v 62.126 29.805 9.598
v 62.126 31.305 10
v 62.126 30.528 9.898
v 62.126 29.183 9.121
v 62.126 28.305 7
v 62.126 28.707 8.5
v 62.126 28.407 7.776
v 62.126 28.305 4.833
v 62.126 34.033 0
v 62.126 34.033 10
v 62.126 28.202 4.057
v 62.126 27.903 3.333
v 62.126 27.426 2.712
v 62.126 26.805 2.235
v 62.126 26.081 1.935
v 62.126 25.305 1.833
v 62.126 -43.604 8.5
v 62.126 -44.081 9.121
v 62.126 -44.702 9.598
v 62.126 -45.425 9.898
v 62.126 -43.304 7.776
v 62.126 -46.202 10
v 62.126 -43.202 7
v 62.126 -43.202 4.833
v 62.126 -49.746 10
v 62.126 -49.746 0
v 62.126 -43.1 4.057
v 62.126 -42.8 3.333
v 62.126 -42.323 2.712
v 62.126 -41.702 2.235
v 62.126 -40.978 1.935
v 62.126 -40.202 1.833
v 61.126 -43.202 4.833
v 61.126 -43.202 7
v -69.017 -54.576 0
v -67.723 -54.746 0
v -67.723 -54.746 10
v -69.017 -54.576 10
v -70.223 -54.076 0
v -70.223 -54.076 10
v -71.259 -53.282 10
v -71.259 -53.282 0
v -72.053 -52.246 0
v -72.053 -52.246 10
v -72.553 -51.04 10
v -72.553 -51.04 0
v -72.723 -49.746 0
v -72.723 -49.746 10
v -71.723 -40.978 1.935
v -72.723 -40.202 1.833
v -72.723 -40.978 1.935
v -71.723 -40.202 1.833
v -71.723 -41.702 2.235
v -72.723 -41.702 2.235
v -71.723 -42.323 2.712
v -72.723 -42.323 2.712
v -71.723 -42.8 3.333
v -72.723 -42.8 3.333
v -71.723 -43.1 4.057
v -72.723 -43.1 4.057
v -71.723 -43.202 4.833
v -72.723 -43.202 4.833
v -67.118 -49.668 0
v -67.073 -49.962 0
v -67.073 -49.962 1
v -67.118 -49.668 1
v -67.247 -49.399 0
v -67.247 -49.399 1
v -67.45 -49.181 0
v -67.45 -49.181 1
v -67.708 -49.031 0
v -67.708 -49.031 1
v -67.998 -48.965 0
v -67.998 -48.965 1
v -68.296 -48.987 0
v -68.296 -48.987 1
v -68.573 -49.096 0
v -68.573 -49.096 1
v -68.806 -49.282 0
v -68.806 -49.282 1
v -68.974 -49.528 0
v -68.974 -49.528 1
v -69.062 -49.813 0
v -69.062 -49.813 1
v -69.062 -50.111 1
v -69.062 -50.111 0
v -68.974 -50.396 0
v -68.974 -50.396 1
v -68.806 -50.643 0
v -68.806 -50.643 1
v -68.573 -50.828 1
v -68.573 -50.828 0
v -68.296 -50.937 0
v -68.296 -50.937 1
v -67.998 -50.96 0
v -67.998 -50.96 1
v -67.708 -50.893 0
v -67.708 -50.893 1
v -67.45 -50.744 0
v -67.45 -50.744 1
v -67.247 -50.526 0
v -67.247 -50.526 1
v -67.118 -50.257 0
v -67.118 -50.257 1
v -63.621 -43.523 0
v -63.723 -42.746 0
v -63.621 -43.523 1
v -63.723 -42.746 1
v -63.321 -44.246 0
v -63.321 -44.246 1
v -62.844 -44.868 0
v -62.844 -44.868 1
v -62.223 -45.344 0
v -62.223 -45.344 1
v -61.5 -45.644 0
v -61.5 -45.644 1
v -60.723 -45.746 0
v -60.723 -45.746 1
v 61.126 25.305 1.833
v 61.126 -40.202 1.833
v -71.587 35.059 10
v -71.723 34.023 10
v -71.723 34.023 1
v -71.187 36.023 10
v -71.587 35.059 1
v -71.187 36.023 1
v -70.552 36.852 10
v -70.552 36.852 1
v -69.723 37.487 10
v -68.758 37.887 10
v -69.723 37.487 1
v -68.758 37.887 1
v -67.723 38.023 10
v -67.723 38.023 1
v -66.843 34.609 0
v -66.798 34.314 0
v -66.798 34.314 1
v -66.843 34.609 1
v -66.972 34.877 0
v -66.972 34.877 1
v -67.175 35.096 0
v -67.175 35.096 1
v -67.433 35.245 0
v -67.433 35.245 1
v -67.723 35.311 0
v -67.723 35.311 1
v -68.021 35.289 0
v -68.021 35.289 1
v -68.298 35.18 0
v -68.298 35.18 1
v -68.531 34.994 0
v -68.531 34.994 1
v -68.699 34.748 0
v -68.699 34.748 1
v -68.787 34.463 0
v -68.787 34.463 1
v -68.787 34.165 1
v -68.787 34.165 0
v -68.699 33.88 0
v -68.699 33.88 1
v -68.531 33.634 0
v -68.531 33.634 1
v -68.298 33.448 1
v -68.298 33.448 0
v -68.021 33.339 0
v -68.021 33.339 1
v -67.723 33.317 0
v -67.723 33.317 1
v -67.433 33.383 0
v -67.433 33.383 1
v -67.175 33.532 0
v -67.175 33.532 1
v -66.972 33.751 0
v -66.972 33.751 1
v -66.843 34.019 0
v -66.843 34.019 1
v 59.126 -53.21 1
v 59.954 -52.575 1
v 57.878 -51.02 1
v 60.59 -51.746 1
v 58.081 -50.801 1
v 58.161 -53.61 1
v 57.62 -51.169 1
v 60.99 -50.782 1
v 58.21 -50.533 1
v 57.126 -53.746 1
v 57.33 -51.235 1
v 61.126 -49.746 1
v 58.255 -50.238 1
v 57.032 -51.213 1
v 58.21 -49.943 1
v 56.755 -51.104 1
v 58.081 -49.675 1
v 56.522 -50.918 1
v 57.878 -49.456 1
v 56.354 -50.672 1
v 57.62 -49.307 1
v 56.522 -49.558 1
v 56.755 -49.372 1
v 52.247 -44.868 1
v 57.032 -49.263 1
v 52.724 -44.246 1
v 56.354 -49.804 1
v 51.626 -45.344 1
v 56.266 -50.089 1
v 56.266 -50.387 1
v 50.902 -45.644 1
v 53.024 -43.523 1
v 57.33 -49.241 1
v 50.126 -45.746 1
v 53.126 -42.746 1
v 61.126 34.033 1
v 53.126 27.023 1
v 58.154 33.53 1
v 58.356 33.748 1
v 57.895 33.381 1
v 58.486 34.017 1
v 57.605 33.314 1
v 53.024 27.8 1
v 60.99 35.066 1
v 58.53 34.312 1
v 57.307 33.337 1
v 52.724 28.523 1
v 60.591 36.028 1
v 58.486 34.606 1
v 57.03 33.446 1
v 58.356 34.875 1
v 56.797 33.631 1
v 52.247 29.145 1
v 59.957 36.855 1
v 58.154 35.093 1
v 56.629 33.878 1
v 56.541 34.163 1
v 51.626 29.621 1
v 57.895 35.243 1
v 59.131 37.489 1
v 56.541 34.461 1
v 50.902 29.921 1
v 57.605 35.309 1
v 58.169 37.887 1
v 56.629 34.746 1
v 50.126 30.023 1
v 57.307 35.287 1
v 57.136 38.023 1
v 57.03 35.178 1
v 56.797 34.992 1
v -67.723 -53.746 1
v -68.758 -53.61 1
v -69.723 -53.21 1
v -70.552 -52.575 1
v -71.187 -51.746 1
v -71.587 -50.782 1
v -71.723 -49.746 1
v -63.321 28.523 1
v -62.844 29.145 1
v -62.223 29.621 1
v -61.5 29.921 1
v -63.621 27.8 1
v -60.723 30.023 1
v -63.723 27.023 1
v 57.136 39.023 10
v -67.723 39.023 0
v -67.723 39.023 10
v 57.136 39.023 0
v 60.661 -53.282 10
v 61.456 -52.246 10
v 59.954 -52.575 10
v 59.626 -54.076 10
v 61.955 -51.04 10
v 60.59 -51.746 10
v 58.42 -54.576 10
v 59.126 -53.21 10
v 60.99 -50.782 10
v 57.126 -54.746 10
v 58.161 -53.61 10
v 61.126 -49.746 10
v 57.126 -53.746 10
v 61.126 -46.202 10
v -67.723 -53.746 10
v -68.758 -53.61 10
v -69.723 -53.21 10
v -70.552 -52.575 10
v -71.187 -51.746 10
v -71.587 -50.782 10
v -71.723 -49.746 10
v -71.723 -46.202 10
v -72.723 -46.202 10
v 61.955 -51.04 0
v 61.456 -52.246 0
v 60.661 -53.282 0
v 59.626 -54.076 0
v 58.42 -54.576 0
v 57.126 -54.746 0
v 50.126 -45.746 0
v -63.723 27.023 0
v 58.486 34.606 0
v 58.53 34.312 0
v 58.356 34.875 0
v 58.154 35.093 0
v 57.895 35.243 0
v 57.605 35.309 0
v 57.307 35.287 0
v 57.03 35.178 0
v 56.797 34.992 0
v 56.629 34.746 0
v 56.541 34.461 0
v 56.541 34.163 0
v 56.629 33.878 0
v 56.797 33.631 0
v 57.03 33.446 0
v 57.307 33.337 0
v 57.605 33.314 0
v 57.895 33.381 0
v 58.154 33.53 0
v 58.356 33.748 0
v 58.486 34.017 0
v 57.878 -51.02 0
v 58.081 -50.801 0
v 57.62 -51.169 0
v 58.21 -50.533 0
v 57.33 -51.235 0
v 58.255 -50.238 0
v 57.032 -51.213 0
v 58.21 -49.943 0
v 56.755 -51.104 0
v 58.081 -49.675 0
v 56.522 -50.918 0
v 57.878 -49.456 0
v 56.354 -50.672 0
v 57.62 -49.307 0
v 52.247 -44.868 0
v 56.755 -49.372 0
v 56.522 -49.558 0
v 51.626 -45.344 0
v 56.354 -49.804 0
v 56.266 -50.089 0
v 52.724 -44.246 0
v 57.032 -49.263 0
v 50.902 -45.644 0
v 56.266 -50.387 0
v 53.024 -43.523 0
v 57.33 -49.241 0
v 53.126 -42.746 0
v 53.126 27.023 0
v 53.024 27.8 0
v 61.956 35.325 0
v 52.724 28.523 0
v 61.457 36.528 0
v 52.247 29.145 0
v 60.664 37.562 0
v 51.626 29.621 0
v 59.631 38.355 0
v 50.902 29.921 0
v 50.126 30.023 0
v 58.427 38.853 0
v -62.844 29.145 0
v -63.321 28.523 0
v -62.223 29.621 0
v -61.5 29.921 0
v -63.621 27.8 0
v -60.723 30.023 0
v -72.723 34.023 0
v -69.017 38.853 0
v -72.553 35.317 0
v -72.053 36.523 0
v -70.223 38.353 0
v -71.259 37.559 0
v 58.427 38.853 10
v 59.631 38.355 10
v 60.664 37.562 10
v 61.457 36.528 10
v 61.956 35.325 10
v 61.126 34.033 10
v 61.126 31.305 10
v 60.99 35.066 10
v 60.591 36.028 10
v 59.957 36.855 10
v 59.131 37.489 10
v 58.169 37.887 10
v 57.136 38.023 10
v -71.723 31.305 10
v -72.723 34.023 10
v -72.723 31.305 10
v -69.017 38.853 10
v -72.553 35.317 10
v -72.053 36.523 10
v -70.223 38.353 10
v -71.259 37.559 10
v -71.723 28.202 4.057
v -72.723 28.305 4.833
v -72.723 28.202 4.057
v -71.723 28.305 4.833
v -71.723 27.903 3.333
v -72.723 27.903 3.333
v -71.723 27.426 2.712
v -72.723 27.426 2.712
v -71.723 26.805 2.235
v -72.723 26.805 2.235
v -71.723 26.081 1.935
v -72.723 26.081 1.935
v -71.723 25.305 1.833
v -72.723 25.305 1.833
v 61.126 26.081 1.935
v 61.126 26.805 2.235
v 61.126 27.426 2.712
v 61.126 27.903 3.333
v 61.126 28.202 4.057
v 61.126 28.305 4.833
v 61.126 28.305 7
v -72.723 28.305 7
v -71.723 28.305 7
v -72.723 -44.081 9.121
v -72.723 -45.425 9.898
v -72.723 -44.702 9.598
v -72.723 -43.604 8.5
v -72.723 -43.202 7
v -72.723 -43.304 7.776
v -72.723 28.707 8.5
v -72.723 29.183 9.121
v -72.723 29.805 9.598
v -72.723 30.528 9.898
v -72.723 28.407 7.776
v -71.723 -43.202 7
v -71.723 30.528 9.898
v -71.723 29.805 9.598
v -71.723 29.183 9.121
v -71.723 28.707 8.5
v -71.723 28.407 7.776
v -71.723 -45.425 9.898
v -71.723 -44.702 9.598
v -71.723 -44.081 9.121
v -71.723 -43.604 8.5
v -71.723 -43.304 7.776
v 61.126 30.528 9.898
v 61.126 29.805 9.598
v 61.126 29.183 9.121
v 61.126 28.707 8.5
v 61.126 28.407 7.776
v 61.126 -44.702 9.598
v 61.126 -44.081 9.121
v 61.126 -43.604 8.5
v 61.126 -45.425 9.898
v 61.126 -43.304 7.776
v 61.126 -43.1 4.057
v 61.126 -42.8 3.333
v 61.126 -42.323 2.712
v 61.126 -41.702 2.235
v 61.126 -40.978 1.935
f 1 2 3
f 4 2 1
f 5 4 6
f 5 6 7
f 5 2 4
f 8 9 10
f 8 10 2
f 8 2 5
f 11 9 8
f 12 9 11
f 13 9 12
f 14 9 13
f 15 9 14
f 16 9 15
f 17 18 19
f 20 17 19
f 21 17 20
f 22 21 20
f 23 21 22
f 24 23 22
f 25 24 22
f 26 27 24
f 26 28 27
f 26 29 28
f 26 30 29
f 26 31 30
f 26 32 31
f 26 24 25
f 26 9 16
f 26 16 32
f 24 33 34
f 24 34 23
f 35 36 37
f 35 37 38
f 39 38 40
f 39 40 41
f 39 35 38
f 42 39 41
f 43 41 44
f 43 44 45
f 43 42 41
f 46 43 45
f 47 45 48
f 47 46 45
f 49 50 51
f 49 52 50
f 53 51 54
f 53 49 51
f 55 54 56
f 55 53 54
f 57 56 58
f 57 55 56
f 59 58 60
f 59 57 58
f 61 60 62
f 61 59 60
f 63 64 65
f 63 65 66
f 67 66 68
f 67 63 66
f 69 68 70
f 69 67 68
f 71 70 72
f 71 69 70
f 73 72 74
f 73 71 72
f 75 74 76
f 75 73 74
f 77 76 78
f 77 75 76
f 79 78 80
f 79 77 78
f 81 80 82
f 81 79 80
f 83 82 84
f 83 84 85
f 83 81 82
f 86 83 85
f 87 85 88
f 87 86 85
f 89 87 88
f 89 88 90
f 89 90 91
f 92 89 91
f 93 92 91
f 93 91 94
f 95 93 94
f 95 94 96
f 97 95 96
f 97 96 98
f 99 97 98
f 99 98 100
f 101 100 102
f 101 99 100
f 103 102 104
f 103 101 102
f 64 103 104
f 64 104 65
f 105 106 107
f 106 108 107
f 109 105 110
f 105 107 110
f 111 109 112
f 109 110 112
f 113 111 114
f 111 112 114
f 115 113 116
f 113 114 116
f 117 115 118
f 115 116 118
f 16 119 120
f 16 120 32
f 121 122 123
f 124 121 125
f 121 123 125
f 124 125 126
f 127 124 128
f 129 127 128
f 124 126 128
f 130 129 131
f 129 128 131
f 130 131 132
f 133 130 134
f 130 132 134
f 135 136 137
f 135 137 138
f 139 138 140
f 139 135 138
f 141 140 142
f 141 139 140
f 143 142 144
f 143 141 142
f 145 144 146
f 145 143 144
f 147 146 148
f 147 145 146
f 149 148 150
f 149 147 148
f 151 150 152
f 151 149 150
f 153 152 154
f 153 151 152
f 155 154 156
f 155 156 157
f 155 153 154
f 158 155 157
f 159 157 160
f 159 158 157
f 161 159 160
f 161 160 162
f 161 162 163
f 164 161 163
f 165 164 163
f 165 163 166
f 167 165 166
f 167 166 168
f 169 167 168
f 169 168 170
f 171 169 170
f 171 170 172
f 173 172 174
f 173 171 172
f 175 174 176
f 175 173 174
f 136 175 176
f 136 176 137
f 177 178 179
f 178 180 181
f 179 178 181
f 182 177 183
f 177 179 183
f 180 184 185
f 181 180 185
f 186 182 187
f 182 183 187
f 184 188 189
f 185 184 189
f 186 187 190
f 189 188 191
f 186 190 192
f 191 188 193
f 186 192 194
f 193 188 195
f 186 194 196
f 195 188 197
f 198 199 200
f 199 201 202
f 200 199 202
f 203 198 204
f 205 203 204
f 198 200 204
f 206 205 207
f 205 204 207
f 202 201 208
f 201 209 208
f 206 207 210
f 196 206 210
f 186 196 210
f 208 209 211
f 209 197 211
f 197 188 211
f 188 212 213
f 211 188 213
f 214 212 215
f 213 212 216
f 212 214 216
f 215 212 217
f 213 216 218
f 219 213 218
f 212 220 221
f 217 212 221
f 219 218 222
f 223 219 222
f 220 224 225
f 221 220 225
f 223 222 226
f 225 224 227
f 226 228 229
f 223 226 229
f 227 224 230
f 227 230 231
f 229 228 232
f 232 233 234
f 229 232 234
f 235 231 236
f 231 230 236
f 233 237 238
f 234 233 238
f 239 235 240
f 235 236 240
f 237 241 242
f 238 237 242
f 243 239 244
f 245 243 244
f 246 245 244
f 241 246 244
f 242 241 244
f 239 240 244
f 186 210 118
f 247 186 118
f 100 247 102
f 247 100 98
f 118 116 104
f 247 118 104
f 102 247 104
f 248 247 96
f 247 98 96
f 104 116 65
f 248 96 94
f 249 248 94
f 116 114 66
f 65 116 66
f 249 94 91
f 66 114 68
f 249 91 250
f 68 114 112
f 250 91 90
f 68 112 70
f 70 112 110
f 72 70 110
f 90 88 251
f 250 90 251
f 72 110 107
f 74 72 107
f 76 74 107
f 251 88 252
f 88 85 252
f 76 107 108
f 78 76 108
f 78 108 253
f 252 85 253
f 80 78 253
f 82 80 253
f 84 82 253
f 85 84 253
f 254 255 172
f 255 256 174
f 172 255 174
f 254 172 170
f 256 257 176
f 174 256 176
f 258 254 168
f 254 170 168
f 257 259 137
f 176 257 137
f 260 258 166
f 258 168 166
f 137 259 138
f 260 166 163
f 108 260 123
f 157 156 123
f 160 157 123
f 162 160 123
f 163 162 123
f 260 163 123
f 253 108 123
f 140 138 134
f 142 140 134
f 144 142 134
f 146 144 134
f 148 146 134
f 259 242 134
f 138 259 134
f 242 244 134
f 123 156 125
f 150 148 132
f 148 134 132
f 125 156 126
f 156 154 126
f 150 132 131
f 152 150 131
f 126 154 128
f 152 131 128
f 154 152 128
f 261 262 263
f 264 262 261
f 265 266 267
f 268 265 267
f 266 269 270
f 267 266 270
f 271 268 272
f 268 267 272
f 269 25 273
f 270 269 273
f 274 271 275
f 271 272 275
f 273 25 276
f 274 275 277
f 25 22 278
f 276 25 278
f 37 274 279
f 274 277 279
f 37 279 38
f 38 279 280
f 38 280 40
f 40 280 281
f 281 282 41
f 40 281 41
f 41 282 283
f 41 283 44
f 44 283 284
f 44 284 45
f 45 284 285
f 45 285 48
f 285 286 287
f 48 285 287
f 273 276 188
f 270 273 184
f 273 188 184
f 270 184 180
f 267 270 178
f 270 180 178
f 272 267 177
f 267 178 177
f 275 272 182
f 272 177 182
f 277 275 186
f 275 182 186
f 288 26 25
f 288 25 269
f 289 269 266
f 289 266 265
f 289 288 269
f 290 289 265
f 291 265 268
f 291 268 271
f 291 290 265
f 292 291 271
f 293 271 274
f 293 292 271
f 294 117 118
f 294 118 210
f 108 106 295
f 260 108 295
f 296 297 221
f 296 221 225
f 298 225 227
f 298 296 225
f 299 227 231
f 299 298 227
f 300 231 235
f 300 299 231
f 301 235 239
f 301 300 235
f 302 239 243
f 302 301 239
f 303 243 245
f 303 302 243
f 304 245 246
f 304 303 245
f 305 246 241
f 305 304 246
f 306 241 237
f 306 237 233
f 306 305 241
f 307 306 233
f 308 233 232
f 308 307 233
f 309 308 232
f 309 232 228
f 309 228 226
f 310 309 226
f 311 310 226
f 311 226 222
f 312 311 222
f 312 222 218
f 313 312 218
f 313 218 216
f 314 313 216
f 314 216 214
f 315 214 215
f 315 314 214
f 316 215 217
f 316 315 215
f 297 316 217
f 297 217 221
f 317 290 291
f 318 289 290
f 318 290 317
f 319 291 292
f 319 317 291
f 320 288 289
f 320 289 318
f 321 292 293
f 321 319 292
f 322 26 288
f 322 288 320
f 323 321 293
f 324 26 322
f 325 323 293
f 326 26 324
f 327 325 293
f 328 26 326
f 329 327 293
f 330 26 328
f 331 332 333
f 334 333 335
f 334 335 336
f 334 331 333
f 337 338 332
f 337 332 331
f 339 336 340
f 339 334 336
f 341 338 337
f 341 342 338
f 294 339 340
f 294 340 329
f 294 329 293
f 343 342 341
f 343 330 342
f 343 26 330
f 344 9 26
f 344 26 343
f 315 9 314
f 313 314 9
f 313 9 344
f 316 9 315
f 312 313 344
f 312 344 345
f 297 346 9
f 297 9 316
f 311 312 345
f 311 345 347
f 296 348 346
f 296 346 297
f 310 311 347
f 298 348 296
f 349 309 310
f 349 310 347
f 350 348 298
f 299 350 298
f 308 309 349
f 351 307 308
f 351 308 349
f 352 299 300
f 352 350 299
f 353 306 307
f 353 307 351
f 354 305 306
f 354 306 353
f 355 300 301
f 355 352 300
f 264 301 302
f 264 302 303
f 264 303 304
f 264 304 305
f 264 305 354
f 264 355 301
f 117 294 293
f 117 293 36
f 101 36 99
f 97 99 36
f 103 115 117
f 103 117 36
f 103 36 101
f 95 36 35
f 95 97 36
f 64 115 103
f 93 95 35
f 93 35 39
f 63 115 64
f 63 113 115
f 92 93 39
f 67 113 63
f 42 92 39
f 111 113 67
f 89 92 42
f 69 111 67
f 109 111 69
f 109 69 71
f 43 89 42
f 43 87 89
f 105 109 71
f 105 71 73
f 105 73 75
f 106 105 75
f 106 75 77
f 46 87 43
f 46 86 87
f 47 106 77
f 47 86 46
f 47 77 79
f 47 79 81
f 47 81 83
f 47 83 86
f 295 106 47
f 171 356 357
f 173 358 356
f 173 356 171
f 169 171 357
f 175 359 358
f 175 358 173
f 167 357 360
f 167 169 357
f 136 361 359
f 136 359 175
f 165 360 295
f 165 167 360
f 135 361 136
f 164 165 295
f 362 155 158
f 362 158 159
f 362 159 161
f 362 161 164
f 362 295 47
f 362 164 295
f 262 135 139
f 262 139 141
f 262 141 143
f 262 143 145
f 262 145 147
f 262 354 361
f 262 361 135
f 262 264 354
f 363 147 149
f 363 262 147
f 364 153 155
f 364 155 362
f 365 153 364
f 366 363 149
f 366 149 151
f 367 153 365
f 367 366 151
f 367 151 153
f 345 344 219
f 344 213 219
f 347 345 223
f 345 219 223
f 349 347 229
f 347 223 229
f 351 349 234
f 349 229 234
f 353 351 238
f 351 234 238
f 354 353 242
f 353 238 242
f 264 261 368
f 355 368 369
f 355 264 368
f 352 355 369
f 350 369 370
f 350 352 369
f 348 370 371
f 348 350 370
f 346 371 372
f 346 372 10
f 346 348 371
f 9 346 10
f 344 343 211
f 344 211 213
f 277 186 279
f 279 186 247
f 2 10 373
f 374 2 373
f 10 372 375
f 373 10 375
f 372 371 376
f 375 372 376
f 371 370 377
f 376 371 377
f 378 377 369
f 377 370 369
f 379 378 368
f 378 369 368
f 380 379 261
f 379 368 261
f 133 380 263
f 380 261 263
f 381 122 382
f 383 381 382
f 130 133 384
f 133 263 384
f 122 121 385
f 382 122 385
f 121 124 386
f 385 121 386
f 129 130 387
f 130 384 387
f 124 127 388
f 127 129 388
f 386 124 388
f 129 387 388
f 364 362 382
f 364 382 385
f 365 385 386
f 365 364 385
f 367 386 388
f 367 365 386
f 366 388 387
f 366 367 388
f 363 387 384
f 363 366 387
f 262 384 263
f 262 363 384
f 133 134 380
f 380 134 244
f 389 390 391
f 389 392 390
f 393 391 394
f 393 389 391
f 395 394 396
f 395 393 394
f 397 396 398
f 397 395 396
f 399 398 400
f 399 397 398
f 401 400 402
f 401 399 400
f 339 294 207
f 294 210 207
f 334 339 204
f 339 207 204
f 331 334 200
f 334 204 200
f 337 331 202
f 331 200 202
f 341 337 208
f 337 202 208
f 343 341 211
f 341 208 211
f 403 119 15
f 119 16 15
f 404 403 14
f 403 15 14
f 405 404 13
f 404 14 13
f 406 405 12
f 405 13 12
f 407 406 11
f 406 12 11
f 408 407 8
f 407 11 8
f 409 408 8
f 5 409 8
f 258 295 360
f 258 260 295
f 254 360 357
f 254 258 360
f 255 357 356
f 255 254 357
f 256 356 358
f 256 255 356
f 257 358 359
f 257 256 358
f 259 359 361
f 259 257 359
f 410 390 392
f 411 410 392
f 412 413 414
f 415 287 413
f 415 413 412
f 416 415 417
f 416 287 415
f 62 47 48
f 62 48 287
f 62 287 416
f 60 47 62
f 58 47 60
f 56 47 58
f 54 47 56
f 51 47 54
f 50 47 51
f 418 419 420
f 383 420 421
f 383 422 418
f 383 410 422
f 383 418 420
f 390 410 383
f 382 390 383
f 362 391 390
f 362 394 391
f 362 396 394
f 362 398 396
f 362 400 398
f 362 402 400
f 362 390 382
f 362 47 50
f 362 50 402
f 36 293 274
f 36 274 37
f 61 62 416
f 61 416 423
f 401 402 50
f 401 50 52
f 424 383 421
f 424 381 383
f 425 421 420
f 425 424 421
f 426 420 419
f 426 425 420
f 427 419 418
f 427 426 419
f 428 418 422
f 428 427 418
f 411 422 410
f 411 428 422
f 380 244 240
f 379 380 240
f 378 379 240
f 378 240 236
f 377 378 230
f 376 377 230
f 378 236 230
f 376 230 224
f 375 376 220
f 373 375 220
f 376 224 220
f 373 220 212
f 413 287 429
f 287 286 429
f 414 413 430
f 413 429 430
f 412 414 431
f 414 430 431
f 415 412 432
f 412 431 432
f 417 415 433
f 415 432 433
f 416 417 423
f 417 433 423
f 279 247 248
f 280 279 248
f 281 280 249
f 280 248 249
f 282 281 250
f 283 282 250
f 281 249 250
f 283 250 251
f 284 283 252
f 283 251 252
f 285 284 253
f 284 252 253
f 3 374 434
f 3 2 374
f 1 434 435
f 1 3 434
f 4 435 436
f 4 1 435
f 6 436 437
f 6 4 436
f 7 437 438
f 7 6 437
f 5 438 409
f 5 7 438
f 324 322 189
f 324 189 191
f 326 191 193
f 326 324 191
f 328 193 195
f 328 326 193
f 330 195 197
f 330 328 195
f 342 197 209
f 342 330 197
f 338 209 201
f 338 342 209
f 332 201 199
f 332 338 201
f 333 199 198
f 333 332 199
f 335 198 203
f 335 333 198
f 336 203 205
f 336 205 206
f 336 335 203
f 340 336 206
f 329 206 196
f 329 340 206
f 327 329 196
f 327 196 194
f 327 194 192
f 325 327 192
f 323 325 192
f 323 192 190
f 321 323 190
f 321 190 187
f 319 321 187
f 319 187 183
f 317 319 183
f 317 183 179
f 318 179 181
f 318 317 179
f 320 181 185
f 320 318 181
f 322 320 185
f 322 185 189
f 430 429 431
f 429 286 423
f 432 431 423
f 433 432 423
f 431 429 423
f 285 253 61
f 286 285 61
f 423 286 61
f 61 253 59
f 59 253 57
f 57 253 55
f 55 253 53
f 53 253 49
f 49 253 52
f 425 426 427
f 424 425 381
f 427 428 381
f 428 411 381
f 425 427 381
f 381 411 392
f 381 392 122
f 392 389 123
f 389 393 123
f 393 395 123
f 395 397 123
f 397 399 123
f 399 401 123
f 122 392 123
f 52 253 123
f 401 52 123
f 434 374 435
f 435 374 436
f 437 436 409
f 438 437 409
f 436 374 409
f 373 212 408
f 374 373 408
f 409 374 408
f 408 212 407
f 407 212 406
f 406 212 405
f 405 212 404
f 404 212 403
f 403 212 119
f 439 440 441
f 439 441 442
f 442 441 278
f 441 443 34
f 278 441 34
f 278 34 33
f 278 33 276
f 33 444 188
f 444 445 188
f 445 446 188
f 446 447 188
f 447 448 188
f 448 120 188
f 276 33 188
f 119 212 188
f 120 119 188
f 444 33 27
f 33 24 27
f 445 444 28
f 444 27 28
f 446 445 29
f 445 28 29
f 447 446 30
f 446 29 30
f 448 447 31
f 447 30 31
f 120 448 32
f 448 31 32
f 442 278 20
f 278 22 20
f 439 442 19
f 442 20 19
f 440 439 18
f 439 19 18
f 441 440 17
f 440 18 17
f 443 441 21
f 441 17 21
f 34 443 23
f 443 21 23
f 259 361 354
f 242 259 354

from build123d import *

# Parameters (mm, degrees)
BOSS_EXTRUDE1_DEPTH = 10
SKETCH2_R           = 1
SKETCH2_W           = 116.84899
SKETCH2_H           = 75.7696
BOSS_EXTRUDE2_DEPTH = 1
CAVITY1_START       = 1.833256049
CAVITY1_OUTLINE_W   = 1
CAVITY1_OUTLINE_H   = 71.506597146
CAVITY1_DEPTH       = 8.166743951
FILLET1_R           = 3
FILLET2_R           = 3
FILLET3_R           = 3


# Read off the part's stored shape, not the designer's step: Cavity1
with BuildPart() as part:
    # Sketch1 → Boss-Extrude1 (new body)
    with BuildSketch(Plane.XY):
        with BuildLine():
            Line((-67.723179308, 39.023349276), (57.135904391, 39.023349276))
            ThreePointArc((57.135904391, 39.023349276), (60.664300974, 37.561839558), (62.125810692, 34.033442975))
            Line((62.125810692, 34.033442975), (62.125810692, -49.746250724))
            ThreePointArc((62.125810692, -49.746250724), (60.661344598, -53.28178463), (57.125810692, -54.746250724))
            Line((57.125810692, -54.746250724), (-67.723179308, -54.746250724))
            ThreePointArc((-67.723179308, -54.746250724), (-71.258713213, -53.28178463), (-72.723179308, -49.746250724))
            Line((-72.723179308, -49.746250724), (-72.723179308, 34.023349276))
            ThreePointArc((-72.723179308, 34.023349276), (-71.258713213, 37.558883182), (-67.723179308, 39.023349276))
        make_face()
        with BuildLine():
            Line((-67.723179308, 38.023349276), (57.135904391, 38.023349276))
            ThreePointArc((57.135904391, 38.023349276), (59.957194193, 36.854732777), (61.125810692, 34.033442975))
            Line((61.125810692, 34.033442975), (61.125810692, -49.746250724))
            ThreePointArc((61.125810692, -49.746250724), (59.954237817, -52.574677849), (57.125810692, -53.746250724))
            Line((57.125810692, -53.746250724), (-67.723179308, -53.746250724))
            ThreePointArc((-67.723179308, -53.746250724), (-70.551606432, -52.574677849), (-71.723179308, -49.746250724))
            Line((-71.723179308, -49.746250724), (-71.723179308, 34.023349276))
            ThreePointArc((-71.723179308, 34.023349276), (-70.551606432, 36.851776401), (-67.723179308, 38.023349276))
        make_face(mode=Mode.SUBTRACT)
    extrude(amount=BOSS_EXTRUDE1_DEPTH)

    # Sketch2 → Boss-Extrude2 (add)
    with BuildSketch(Plane.XY):
        with BuildLine():
            Line((-67.723179308, 38.023349276), (57.135904391, 38.023349276))
            ThreePointArc((57.135904391, 38.023349276), (59.957194193, 36.854732777), (61.125810692, 34.033442975))
            Line((61.125810692, 34.033442975), (61.125810692, -49.746250724))
            ThreePointArc((61.125810692, -49.746250724), (59.954237817, -52.574677849), (57.125810692, -53.746250724))
            Line((57.125810692, -53.746250724), (-67.723179308, -53.746250724))
            ThreePointArc((-67.723179308, -53.746250724), (-70.551606432, -52.574677849), (-71.723179308, -49.746250724))
            Line((-71.723179308, -49.746250724), (-71.723179308, 34.023349276))
            ThreePointArc((-71.723179308, 34.023349276), (-70.551606432, 36.851776401), (-67.723179308, 38.023349276))
        make_face()
        with Locations((-67.798179308, 34.314149276)):
            Circle(SKETCH2_R, mode=Mode.SUBTRACT)
        with Locations((-68.073179308, -49.962350724)):
            Circle(SKETCH2_R, mode=Mode.SUBTRACT)
        with Locations((57.254910692, -50.238050724)):
            Circle(SKETCH2_R, mode=Mode.SUBTRACT)
        with Locations((57.530010692, 34.311649276)):
            Circle(SKETCH2_R, mode=Mode.SUBTRACT)
        with Locations((-5.298684308, -7.861450724)):
            Rectangle(SKETCH2_W, SKETCH2_H, mode=Mode.SUBTRACT)
    extrude(amount=BOSS_EXTRUDE2_DEPTH)

    # Cavity1 outline → Cavity1 (cut)
    with BuildSketch(Plane.XY.offset(CAVITY1_START)):
        with Locations((61.625810692, -7.448622115)):
            Rectangle(CAVITY1_OUTLINE_W, CAVITY1_OUTLINE_H)
        with Locations((-72.223179308, -7.448622115)):
            Rectangle(CAVITY1_OUTLINE_W, CAVITY1_OUTLINE_H)
    extrude(amount=CAVITY1_DEPTH, mode=Mode.SUBTRACT)

    # Fillet1
    fillet1_edges = [part.edges().sort_by_distance(p)[0] for p in [
        (61.625810692, -43.201920688, 10),
        (-72.223179308, -43.201920688, 10),
        (-72.223179308, 28.304676458, 10),
        (61.625810692, 28.304676458, 10),
    ]]
    fillet(fillet1_edges, radius=FILLET1_R)

    # Fillet2
    fillet2_edges = [part.edges().sort_by_distance(p)[0] for p in [
        (-72.223179308, -43.201920688, 1.833256049),
        (-72.223179308, 28.304676458, 1.833256049),
        (61.625810692, -43.201920688, 1.833256049),
        (61.625810692, 28.304676458, 1.833256049),
    ]]
    fillet(fillet2_edges, radius=FILLET2_R)

    # Fillet3
    fillet3_edges = [part.edges().sort_by_distance(p)[0] for p in [
        (-63.723179308, -45.746250724, 0.5),
        (53.125810692, -45.746250724, 0.5),
        (53.125810692, 30.023349276, 0.5),
        (-63.723179308, 30.023349276, 0.5),
    ]]
    fillet(fillet3_edges, radius=FILLET3_R)


solid = part.part
